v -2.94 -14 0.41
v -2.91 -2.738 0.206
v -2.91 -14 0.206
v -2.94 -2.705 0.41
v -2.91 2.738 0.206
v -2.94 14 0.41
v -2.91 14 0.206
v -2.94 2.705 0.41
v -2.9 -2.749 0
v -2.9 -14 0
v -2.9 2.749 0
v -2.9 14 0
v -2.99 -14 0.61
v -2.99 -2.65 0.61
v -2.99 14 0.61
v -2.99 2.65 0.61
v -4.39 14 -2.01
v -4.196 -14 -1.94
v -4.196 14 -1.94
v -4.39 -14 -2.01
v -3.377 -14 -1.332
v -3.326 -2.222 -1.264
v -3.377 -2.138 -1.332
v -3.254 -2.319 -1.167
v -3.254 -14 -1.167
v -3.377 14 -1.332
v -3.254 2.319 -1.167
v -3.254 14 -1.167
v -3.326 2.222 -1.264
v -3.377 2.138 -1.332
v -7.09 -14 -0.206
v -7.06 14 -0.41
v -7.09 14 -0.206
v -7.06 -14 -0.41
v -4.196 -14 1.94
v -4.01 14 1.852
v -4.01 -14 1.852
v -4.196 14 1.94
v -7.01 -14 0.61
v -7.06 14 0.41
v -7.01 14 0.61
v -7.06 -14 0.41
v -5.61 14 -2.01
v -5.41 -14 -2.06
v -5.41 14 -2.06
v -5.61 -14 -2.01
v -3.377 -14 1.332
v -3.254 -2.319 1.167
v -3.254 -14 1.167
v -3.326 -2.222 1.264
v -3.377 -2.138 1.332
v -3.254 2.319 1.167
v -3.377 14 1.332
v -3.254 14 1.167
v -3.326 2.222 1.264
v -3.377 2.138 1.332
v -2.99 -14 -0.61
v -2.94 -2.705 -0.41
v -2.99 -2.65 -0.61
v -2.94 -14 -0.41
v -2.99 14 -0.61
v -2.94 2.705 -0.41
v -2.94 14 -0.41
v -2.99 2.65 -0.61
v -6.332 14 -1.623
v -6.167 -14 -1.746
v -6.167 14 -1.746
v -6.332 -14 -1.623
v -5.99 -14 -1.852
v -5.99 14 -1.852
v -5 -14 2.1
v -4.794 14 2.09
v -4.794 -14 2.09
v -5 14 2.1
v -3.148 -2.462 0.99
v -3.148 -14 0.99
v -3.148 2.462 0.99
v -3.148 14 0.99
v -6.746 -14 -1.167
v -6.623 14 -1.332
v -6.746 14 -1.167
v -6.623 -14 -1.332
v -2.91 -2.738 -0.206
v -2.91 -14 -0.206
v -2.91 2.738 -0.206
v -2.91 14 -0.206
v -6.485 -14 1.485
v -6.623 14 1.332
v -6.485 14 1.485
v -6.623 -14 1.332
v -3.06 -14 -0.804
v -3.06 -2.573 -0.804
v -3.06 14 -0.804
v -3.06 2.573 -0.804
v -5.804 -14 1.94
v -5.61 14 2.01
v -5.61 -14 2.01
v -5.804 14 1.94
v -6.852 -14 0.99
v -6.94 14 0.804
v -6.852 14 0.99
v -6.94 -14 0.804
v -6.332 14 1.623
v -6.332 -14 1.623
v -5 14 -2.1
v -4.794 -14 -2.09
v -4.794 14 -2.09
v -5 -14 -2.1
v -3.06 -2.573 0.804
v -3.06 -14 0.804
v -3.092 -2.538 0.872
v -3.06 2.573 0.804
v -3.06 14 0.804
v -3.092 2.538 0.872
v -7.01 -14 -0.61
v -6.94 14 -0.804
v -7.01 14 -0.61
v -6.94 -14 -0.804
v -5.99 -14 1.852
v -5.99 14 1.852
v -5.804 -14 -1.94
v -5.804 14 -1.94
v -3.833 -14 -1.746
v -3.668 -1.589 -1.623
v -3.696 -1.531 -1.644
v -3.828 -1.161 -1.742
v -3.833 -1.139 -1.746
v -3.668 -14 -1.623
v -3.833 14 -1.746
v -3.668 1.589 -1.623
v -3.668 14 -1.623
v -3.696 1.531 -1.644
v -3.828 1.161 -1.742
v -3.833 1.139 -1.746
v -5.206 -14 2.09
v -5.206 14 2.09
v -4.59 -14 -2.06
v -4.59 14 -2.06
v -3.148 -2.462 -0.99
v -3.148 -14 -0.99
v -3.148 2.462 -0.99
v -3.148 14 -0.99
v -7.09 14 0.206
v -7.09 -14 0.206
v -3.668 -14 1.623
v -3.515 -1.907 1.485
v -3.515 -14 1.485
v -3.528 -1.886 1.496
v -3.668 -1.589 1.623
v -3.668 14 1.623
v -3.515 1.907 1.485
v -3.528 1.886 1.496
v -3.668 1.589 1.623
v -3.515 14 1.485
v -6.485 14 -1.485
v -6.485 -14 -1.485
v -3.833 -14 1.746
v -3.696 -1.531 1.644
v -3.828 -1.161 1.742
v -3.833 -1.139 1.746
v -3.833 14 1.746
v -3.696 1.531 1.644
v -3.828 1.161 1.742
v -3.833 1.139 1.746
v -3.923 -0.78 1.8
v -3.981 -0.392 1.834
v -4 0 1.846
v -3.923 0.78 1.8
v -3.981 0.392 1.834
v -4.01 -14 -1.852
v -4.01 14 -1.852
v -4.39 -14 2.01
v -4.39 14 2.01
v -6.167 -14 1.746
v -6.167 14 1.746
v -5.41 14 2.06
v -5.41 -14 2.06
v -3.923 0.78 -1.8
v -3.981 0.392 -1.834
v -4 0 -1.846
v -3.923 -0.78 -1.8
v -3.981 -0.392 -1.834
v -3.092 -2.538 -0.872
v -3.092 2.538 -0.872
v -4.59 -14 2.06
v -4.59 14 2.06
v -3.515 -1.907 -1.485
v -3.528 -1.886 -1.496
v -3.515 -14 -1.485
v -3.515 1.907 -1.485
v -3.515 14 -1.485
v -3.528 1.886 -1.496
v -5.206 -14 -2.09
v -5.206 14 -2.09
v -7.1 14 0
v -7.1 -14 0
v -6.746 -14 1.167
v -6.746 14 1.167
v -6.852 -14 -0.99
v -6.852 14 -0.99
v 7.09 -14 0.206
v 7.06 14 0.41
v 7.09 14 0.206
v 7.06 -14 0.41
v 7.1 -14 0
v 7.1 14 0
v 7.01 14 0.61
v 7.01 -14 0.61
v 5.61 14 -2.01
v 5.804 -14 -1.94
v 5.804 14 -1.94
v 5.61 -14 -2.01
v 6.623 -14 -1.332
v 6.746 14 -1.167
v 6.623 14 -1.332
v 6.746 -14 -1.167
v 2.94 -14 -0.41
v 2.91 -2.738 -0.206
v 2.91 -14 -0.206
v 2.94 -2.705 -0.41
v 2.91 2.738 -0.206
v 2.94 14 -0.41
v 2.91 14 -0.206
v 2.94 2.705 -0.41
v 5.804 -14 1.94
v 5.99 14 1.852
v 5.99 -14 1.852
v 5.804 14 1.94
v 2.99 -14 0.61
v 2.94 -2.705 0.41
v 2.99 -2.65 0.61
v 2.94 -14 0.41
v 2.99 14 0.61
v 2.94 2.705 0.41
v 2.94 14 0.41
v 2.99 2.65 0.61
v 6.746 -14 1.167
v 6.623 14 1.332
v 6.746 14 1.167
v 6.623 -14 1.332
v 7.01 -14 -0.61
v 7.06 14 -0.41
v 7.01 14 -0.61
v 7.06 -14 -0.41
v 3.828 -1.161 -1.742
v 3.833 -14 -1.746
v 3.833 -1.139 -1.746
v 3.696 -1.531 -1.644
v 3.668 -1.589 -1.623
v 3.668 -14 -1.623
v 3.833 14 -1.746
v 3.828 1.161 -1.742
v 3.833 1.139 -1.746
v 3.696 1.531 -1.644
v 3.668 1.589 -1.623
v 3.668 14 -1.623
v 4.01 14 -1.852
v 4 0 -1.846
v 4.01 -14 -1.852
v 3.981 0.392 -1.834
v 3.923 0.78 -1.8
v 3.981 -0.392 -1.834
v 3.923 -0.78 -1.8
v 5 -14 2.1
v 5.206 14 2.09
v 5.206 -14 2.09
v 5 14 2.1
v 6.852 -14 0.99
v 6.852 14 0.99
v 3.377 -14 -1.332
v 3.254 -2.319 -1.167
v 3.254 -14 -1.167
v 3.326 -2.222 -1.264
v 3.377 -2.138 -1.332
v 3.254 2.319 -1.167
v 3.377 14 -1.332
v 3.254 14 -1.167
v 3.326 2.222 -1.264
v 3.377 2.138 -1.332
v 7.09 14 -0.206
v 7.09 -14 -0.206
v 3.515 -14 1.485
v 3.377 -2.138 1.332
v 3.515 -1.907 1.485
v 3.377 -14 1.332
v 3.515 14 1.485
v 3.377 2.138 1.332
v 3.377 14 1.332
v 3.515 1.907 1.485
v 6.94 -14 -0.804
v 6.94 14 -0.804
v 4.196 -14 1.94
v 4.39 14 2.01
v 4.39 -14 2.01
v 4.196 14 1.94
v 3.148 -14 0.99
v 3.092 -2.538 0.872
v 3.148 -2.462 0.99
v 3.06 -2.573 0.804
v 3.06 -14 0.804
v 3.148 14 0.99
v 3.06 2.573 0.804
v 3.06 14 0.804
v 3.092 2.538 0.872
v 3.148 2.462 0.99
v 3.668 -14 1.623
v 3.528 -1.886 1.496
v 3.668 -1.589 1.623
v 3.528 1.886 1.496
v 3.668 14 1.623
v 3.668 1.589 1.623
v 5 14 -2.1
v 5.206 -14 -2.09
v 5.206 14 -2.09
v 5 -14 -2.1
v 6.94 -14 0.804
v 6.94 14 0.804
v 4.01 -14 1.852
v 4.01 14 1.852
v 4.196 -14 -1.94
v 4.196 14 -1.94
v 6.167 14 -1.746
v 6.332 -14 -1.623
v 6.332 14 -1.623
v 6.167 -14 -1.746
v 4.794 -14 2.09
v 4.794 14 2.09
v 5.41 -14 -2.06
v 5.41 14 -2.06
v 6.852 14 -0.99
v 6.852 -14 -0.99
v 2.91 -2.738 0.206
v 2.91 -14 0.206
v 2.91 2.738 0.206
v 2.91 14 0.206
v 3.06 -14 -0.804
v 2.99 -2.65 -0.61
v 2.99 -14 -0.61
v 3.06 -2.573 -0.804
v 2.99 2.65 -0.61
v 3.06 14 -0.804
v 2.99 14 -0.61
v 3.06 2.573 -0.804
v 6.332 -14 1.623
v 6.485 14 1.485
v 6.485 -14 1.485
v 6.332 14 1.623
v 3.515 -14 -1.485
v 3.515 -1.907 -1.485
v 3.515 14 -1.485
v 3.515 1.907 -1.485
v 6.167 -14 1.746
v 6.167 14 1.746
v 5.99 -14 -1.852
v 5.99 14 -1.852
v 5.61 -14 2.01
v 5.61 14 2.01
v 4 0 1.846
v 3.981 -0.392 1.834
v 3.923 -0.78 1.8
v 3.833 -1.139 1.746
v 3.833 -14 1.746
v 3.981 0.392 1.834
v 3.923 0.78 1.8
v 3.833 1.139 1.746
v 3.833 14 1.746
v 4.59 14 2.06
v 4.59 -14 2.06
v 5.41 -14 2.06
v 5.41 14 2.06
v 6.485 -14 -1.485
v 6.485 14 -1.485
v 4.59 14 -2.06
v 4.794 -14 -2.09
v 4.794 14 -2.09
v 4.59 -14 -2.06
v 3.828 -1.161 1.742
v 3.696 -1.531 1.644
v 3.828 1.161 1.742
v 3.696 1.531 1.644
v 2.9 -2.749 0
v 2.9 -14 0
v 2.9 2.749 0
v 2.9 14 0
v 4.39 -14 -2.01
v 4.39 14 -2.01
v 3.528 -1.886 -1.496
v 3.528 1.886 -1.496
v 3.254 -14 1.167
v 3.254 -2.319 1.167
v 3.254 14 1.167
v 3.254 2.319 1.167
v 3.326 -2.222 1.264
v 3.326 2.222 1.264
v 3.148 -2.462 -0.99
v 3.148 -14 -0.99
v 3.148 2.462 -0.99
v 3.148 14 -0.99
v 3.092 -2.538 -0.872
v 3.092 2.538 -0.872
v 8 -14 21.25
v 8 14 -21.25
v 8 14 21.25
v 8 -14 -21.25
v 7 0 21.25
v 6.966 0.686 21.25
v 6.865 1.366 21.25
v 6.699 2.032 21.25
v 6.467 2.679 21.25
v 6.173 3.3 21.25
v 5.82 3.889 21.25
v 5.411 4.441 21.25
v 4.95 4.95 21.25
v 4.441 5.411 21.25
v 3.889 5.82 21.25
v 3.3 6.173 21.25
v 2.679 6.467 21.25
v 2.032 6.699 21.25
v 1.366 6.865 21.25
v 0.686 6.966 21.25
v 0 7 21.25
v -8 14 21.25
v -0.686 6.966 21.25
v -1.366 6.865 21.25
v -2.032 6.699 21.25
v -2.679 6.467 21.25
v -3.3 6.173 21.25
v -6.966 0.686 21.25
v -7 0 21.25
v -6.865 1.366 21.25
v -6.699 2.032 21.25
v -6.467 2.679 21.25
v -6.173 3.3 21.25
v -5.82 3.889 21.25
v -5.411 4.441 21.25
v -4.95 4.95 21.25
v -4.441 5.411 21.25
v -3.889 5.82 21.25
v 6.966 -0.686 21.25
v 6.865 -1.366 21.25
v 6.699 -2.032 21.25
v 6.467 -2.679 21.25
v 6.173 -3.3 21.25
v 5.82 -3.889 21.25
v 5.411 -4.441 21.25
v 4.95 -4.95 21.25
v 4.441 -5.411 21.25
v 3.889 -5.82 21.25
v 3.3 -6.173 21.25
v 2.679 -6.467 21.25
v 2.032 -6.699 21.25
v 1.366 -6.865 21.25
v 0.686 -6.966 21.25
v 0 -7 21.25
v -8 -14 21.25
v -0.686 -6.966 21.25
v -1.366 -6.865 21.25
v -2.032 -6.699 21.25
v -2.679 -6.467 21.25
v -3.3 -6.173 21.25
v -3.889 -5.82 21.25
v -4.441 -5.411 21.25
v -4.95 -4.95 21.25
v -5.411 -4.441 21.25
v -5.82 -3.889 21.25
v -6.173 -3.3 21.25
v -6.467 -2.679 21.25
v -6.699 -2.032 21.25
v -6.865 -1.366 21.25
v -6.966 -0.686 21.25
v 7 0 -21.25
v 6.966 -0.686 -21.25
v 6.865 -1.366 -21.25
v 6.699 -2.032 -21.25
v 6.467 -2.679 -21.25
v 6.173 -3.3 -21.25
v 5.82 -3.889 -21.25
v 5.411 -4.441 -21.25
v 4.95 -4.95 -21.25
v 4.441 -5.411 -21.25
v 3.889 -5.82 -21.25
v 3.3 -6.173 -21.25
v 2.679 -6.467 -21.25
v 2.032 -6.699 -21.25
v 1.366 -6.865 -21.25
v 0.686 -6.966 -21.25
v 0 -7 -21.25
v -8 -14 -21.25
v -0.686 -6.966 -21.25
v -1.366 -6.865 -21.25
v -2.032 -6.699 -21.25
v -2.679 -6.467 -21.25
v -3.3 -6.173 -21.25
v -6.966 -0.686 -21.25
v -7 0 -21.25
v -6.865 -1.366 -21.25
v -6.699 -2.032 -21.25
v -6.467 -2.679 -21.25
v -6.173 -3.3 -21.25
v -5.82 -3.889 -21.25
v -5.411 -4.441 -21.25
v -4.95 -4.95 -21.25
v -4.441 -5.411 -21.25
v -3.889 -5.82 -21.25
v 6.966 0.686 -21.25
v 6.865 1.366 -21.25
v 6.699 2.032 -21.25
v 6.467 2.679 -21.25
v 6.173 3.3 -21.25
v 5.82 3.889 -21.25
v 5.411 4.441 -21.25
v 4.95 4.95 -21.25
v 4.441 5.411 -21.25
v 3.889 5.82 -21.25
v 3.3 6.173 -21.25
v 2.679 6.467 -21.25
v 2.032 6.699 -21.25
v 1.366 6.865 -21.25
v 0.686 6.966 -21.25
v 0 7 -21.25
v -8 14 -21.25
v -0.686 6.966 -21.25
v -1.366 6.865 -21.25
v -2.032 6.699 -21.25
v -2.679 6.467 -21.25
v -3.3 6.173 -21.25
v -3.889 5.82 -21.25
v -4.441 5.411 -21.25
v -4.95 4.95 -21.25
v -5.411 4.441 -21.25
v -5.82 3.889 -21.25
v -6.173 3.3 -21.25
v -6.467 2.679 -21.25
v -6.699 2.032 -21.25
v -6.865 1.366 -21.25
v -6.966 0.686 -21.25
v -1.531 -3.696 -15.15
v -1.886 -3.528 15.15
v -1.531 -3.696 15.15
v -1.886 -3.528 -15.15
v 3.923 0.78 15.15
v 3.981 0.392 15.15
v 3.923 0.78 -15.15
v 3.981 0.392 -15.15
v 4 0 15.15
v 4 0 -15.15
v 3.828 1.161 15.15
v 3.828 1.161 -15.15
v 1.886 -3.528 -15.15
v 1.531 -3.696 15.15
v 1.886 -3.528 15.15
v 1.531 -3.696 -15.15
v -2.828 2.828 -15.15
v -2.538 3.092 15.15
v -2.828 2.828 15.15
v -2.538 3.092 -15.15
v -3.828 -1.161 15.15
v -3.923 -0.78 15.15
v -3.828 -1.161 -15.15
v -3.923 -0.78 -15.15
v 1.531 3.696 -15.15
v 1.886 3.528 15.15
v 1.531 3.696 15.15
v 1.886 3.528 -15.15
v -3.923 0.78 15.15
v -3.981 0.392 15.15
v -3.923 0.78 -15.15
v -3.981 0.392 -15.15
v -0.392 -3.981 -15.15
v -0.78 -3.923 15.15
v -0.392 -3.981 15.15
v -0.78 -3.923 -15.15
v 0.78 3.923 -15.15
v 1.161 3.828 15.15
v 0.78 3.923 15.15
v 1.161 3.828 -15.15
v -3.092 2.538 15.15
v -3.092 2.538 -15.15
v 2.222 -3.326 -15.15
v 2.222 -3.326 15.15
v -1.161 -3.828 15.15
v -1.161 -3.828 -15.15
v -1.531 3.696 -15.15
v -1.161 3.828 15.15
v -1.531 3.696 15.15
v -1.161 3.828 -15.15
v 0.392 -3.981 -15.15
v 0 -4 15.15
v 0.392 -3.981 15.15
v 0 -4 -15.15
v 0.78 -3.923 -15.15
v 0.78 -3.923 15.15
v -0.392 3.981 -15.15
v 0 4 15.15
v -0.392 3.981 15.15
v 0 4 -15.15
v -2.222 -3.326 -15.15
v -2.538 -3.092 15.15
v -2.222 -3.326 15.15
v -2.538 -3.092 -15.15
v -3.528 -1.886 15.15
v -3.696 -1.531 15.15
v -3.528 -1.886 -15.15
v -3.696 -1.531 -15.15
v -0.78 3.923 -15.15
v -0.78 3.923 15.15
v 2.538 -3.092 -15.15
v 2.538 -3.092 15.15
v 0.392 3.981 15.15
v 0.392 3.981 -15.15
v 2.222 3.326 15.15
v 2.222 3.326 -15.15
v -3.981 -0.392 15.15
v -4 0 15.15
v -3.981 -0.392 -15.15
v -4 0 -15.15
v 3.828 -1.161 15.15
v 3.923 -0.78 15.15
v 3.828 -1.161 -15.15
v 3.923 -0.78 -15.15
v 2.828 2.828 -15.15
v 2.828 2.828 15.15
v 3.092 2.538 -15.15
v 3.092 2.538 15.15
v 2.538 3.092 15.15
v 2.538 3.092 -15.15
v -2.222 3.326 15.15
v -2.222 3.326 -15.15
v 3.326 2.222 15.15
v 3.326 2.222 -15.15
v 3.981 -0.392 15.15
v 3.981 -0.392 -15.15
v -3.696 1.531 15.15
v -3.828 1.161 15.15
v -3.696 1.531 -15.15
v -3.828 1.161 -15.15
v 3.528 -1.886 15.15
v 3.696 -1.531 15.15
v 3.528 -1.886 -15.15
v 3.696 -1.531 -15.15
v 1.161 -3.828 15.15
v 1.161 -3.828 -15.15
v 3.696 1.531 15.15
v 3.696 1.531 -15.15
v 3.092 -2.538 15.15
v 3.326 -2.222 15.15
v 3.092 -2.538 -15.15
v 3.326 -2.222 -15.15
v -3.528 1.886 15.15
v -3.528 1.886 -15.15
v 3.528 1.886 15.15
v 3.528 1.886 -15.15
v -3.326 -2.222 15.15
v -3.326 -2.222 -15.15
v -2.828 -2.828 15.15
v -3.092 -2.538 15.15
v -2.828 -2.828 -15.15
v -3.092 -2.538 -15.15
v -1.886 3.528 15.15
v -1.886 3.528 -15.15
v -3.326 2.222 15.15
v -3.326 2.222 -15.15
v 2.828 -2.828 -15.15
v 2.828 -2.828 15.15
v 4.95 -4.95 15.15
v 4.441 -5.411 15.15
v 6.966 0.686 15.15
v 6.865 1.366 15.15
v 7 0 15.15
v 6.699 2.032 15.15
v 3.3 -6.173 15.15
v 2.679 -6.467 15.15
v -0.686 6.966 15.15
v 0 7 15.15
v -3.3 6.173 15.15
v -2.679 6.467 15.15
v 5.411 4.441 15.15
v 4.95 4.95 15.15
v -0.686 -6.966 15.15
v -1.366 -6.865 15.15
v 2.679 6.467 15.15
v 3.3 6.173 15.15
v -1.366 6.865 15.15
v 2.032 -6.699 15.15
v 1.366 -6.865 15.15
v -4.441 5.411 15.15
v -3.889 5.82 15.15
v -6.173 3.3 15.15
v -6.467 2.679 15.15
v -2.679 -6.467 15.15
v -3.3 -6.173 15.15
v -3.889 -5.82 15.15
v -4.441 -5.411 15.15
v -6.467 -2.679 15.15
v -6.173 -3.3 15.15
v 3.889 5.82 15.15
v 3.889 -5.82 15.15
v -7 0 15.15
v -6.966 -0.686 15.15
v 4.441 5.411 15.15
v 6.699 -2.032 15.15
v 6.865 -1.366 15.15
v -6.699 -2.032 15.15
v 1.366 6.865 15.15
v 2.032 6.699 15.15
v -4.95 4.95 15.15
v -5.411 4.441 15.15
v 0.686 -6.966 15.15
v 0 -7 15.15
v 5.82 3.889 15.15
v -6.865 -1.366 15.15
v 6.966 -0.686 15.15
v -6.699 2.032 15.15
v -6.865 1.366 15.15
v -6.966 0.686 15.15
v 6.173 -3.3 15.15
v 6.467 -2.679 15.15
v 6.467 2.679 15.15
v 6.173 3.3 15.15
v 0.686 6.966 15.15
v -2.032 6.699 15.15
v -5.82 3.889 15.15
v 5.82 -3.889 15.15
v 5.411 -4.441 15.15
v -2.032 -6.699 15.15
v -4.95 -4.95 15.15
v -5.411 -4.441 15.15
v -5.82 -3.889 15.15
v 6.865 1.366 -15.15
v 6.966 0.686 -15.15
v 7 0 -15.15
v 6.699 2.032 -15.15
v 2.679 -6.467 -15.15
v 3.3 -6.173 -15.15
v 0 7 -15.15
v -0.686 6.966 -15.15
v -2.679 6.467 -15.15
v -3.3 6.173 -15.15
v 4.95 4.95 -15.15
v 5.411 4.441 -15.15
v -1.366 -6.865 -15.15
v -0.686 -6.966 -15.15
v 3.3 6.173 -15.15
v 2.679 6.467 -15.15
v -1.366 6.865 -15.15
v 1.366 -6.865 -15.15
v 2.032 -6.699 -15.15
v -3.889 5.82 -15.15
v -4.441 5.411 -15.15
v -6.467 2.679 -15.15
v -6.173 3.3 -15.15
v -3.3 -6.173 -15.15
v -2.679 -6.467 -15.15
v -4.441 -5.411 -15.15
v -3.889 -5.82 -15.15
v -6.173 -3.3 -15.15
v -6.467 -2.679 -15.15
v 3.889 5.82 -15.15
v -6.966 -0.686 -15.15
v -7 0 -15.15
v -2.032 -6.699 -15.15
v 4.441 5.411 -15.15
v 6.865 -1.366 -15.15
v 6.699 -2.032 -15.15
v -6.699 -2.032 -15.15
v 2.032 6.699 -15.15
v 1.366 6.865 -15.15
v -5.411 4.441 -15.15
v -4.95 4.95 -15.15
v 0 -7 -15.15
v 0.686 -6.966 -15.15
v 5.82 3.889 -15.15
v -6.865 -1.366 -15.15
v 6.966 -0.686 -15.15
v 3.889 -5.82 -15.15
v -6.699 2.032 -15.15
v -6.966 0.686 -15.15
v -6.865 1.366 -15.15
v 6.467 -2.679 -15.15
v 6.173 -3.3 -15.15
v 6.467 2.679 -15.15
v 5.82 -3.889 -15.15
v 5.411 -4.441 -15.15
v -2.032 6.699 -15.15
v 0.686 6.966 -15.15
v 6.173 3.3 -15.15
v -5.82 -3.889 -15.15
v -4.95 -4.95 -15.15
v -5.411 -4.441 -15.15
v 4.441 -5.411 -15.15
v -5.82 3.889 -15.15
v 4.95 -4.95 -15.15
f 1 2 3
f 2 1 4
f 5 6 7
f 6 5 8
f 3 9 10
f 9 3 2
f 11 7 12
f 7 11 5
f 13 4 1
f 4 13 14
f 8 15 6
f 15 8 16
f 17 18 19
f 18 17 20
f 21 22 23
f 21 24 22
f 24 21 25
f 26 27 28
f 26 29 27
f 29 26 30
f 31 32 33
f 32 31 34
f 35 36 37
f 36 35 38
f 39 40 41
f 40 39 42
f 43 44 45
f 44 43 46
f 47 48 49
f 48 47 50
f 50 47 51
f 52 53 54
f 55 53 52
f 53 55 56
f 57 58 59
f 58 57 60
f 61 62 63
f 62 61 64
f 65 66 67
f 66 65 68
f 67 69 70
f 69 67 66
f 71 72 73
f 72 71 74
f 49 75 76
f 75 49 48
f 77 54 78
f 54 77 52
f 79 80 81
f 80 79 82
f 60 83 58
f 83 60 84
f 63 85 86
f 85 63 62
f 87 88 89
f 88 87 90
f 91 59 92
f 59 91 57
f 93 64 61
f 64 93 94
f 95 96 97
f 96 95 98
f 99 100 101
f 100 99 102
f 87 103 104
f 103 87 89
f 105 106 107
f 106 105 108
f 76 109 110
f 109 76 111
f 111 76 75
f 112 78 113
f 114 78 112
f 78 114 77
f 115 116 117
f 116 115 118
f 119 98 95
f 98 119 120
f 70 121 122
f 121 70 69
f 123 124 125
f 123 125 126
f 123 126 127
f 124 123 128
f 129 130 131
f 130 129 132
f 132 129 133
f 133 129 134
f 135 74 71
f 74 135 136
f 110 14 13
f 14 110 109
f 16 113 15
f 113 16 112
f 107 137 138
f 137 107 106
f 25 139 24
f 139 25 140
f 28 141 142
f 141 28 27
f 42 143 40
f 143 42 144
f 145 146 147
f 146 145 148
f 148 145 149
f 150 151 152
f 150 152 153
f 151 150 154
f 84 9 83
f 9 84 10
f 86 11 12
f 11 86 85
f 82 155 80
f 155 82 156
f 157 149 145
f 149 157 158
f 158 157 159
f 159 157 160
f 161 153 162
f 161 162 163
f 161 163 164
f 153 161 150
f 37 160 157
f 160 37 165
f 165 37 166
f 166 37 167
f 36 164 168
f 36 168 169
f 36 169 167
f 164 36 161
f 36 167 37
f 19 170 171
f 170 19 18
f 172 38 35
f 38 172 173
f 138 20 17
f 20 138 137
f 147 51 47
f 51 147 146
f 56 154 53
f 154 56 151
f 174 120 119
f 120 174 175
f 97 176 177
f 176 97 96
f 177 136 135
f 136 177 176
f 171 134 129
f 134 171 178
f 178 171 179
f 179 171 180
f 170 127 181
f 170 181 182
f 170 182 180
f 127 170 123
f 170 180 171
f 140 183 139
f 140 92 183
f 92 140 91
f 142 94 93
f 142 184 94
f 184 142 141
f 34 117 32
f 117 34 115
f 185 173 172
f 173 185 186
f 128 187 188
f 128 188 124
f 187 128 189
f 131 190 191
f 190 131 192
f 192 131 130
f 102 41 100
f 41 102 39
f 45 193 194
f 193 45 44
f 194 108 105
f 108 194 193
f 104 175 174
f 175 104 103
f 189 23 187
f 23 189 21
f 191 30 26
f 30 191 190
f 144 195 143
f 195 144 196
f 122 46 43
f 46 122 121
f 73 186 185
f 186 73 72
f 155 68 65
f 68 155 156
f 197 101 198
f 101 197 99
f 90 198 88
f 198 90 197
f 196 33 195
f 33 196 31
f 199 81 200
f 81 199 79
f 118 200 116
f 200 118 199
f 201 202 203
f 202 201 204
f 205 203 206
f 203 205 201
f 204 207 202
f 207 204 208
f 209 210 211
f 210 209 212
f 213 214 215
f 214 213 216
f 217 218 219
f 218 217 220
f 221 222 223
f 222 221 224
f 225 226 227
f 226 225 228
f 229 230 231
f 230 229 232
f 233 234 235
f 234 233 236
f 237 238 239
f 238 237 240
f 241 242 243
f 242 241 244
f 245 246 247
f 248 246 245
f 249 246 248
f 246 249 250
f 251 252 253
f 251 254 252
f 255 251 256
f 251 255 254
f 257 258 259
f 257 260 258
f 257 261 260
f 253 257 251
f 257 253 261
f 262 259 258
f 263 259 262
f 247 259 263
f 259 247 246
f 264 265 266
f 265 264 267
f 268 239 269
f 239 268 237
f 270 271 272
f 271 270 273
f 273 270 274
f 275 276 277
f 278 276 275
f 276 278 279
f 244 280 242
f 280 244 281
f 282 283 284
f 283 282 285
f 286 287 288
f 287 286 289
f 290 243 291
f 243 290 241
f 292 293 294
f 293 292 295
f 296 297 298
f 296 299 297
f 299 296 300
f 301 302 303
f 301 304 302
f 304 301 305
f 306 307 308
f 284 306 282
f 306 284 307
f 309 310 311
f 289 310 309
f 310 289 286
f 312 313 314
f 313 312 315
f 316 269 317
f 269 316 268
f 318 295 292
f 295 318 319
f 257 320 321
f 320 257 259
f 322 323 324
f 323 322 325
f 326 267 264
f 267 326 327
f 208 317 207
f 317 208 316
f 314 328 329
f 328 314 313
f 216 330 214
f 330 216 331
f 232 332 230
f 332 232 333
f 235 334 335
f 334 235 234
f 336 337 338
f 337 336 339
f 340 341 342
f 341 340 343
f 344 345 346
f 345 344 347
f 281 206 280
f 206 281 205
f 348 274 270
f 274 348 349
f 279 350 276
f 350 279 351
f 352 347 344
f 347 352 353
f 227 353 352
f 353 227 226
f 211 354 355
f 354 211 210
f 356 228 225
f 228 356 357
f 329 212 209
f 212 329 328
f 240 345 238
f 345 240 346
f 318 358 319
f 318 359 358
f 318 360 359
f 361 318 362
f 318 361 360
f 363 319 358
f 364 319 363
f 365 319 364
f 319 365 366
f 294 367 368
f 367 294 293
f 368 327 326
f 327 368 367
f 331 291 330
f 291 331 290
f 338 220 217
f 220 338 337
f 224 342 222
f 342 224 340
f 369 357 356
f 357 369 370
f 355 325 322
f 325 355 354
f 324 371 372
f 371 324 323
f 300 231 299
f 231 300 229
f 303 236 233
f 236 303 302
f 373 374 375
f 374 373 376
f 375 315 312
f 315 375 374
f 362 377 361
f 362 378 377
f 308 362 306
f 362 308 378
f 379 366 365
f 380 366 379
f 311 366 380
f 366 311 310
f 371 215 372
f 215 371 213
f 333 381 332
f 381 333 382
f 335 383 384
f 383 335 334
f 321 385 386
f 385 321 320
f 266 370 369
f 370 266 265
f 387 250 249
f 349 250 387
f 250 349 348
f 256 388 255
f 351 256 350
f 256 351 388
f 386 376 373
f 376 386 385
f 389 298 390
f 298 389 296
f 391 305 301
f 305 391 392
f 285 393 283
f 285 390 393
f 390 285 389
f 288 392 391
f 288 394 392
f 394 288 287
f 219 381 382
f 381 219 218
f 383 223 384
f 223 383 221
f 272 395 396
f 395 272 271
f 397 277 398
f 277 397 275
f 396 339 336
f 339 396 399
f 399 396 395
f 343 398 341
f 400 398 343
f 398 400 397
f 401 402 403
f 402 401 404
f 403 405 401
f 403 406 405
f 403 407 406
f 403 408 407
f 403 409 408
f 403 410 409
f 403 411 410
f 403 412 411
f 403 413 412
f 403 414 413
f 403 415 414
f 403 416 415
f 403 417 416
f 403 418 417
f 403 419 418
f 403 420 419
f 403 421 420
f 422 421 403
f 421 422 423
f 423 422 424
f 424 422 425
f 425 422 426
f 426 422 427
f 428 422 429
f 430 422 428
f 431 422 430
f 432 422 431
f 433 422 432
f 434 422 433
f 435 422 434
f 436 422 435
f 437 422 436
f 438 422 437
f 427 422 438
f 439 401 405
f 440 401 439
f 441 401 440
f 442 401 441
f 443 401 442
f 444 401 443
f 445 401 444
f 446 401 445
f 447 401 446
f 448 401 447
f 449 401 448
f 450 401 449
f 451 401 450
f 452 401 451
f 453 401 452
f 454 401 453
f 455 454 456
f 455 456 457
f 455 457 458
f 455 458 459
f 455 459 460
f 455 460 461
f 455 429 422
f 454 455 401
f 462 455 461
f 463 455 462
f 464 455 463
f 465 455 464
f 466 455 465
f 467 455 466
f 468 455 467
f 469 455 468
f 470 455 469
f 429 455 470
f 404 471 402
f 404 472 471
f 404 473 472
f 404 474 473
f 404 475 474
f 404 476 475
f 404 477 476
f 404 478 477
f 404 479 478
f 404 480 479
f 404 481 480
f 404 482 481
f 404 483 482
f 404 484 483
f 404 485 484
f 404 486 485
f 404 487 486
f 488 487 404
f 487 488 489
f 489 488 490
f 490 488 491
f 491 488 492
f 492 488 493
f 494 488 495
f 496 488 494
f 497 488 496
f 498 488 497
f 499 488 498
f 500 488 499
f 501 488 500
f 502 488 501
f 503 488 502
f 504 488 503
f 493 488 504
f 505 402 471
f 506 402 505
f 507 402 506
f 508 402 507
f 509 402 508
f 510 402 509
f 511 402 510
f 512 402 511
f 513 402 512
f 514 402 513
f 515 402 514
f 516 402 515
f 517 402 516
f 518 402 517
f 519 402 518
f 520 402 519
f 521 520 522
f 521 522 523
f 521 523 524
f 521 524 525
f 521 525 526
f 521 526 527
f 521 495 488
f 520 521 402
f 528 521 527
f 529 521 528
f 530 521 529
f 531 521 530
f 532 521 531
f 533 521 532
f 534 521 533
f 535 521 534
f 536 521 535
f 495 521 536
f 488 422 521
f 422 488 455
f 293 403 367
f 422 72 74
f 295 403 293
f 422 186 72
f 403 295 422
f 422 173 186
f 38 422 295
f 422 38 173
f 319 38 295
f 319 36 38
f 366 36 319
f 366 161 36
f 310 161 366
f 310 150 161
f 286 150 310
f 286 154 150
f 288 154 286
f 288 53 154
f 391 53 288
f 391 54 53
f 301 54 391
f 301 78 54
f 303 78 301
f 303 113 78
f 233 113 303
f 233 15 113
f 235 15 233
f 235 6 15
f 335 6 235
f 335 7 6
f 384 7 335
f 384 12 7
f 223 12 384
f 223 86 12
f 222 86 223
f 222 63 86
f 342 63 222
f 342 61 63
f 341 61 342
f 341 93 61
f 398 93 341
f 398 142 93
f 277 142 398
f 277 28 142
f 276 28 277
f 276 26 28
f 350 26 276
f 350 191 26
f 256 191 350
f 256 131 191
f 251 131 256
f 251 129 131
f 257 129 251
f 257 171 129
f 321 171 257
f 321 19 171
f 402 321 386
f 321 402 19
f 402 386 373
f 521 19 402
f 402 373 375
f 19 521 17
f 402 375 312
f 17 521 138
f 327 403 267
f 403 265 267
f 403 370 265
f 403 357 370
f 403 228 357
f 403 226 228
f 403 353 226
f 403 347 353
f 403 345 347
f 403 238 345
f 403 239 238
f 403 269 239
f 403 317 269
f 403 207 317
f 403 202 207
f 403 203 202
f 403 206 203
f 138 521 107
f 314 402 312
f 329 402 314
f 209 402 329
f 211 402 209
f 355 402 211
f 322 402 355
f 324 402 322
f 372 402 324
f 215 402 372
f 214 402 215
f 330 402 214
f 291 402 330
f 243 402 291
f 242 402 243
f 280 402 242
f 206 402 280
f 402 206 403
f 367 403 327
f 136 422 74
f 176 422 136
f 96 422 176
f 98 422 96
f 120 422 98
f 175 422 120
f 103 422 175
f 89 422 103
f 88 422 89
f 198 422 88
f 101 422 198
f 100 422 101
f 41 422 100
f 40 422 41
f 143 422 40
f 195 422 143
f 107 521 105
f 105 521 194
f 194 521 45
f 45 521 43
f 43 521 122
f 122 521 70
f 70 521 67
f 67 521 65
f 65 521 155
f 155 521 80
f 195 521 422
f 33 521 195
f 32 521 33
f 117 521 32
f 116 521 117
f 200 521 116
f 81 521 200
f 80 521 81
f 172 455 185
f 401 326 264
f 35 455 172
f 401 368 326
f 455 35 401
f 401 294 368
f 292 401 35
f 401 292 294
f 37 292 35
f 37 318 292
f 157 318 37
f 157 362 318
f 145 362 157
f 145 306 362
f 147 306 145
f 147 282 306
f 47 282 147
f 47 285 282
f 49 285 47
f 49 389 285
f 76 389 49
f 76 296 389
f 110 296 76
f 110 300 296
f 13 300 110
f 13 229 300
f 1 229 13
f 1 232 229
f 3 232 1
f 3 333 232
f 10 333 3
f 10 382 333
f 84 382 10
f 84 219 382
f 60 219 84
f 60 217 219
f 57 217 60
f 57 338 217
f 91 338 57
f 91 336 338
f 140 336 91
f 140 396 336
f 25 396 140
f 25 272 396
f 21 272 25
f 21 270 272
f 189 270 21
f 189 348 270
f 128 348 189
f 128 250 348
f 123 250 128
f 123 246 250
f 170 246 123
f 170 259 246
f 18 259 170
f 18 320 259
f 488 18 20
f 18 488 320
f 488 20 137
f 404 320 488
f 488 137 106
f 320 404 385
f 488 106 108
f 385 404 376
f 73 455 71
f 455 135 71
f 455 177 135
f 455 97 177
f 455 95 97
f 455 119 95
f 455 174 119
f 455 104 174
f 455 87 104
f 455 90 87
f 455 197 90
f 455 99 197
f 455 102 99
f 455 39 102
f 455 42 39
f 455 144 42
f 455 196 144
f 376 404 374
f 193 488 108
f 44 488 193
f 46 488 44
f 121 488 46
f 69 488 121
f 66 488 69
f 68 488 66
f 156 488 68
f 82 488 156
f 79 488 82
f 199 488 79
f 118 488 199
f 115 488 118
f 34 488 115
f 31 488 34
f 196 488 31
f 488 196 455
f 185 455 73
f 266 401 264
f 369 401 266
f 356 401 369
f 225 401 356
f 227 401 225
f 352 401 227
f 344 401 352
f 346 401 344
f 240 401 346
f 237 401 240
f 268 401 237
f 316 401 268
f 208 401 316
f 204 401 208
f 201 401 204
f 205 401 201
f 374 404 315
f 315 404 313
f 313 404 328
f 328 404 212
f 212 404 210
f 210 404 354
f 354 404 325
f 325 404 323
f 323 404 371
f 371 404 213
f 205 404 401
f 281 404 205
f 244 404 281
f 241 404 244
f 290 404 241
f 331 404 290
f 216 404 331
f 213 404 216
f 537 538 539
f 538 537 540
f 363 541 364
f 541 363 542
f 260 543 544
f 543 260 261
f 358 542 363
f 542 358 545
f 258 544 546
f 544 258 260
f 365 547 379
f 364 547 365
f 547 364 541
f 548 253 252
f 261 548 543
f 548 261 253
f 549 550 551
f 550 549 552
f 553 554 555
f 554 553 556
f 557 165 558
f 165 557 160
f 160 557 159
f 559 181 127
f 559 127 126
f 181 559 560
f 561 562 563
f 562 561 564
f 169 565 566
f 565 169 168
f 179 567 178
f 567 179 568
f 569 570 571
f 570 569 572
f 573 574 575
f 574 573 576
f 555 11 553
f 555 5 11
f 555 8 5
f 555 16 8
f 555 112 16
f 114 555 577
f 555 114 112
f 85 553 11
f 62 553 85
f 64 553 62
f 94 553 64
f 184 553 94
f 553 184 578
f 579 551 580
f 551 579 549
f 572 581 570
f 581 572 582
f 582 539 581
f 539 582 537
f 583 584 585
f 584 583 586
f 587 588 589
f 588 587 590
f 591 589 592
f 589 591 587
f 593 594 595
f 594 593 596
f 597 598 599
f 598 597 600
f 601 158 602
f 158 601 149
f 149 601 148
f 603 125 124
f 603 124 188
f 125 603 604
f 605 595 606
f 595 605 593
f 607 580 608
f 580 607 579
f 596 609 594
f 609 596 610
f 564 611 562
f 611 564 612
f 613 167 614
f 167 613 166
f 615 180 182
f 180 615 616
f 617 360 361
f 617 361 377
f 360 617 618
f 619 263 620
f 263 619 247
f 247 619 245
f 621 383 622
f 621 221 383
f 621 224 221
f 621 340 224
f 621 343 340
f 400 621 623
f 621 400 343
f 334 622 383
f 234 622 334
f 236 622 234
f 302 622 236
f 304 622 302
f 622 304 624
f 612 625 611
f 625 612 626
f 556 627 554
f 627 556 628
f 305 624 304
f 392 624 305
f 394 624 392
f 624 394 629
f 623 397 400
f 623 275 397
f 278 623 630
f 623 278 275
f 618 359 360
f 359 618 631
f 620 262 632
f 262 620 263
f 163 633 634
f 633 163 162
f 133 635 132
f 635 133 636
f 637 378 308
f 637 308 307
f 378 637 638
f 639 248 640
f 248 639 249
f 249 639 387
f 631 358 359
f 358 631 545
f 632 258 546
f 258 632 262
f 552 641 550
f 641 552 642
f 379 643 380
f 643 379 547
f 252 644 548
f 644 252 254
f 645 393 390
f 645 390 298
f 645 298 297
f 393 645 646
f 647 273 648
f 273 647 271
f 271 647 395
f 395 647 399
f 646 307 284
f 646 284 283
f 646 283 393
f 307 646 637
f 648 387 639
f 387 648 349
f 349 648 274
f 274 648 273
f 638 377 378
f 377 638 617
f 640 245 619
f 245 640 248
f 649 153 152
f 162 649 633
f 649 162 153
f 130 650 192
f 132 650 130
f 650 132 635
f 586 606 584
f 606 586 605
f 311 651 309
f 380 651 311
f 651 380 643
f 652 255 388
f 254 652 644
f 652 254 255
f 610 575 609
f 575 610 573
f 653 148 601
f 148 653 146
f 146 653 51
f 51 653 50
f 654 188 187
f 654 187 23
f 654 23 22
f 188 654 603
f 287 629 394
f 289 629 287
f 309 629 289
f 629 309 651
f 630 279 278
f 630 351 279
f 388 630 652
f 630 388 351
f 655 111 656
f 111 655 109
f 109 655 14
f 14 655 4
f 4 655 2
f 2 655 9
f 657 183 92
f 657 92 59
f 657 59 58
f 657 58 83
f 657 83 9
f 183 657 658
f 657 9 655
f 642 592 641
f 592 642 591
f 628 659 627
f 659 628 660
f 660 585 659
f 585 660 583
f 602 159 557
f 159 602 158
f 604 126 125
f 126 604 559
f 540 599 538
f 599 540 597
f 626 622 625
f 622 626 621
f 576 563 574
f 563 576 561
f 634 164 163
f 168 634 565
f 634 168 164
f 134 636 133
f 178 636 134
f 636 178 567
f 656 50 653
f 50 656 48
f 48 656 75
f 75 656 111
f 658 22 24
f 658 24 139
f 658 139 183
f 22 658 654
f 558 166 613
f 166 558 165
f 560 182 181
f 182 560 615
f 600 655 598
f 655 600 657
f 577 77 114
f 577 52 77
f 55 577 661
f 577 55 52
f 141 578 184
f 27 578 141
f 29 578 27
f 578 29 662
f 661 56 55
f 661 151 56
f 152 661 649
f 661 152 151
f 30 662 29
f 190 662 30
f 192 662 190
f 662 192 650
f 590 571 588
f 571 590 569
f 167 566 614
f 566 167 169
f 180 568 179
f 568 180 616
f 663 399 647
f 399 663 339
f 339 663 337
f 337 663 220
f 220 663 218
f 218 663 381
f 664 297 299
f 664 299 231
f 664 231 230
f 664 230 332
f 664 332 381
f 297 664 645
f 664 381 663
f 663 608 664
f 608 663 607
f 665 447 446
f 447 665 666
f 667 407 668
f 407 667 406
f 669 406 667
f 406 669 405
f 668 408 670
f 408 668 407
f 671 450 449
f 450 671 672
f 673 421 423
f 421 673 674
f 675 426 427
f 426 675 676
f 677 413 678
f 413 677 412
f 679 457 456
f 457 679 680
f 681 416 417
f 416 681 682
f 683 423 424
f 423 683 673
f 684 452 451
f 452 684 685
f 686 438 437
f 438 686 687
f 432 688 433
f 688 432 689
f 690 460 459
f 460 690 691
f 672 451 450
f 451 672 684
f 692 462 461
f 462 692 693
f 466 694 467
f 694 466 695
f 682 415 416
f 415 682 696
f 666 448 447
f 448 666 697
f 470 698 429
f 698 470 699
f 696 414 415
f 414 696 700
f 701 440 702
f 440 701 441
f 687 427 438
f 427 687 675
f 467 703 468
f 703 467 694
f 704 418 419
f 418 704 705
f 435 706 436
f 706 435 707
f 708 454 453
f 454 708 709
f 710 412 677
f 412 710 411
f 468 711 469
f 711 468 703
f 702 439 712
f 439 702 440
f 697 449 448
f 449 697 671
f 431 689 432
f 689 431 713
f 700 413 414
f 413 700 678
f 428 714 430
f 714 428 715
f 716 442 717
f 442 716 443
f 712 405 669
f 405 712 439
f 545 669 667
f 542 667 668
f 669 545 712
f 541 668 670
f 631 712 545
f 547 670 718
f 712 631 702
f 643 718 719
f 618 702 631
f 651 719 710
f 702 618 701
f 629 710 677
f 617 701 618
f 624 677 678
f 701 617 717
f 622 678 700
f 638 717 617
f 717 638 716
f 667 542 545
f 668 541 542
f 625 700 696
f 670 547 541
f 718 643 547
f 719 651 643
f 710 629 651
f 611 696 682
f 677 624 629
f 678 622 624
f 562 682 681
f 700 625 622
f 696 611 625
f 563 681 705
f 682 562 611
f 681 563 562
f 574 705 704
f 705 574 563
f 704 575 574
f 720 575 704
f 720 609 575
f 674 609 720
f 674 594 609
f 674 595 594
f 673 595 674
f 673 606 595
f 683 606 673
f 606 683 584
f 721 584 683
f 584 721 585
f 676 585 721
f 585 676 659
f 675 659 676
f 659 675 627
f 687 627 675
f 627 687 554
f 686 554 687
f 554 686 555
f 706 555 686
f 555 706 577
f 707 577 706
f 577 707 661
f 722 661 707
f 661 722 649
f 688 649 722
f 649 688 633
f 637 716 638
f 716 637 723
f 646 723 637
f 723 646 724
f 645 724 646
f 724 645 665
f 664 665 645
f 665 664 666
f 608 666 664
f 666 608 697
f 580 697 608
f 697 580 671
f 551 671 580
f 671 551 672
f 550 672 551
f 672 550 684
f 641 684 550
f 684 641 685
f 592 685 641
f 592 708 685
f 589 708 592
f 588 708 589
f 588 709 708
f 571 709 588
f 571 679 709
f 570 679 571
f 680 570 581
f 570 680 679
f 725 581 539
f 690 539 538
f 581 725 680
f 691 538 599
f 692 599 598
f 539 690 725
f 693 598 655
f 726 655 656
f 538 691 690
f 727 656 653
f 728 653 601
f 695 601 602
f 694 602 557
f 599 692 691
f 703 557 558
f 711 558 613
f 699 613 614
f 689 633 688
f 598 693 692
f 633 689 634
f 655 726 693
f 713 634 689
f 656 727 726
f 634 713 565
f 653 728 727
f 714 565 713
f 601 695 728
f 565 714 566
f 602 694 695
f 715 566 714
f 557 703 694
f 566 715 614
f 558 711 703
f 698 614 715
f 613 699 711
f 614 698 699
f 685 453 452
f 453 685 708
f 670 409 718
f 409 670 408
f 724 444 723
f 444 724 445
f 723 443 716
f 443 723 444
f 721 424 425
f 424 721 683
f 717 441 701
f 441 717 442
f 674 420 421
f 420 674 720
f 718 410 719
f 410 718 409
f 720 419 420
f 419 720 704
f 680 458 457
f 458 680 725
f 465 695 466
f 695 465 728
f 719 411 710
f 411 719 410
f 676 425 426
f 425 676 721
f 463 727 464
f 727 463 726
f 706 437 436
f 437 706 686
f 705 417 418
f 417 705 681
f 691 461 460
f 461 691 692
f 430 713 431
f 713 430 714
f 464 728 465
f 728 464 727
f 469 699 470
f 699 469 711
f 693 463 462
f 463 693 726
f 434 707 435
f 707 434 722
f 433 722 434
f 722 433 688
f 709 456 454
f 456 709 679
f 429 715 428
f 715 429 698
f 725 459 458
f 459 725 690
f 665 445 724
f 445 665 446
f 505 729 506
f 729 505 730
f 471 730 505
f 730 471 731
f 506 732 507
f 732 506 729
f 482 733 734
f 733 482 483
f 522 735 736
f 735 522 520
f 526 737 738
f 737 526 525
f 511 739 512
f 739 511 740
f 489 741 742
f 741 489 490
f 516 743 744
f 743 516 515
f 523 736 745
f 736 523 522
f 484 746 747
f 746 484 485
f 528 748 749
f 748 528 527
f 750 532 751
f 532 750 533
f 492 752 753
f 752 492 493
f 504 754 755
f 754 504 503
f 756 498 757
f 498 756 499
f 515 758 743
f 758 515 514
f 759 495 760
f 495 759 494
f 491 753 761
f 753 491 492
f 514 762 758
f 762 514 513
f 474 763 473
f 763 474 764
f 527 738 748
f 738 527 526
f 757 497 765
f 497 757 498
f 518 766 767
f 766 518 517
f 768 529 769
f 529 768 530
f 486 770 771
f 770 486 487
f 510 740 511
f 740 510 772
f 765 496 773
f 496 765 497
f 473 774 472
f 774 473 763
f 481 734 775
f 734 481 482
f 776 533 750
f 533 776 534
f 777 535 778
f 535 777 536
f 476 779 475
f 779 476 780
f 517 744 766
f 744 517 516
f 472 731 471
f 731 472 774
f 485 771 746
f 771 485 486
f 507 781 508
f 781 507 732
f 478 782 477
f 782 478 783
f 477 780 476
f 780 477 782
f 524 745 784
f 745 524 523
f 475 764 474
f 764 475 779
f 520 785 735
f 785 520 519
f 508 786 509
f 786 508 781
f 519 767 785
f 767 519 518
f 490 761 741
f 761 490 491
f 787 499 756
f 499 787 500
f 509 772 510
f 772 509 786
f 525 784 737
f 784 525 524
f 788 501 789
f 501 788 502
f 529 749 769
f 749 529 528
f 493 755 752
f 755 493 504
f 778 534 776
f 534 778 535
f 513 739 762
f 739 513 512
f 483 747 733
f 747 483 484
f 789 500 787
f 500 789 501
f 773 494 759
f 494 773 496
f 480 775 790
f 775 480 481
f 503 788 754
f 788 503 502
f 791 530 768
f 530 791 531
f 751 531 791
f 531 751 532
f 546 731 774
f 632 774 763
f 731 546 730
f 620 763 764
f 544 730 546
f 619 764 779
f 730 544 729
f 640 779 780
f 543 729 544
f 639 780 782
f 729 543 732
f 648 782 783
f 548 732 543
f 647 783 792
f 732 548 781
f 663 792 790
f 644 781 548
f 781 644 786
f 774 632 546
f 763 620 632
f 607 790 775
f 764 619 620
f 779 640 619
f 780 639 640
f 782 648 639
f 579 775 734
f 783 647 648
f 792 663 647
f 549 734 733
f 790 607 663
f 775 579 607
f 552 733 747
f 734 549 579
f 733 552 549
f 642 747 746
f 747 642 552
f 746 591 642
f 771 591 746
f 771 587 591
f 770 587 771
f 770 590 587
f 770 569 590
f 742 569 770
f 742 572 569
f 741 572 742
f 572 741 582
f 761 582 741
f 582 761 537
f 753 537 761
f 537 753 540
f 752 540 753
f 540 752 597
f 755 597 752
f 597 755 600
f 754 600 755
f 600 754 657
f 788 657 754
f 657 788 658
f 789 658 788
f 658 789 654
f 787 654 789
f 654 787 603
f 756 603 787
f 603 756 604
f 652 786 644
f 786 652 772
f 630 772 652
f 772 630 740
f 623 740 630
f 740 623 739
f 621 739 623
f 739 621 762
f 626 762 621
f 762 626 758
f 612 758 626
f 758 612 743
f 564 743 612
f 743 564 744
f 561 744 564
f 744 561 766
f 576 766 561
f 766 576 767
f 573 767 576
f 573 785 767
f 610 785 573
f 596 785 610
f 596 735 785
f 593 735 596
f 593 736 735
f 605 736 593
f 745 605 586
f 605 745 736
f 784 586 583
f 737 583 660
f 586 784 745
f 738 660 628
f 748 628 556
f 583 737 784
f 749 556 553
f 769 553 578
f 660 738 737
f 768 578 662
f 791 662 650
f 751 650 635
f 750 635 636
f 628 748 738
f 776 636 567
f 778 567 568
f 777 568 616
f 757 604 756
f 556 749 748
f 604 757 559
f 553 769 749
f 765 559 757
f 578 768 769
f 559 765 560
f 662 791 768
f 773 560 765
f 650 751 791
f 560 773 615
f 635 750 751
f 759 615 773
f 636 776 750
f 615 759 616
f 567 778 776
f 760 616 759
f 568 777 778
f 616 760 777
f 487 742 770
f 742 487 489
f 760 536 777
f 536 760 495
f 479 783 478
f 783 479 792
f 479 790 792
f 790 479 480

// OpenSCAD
$fn=64;

block_x = 16.0;
block_y = 28.0;
block_z = 42.5;

lead_bore_d = 8.0;
counterbore_d = 14.0;
counterbore_depth = 6.0;

mount_hole_d = 4.2;
mount_hole_x_offset = 5.0;
mount_hole_y_offset = 9.0;

module centered_block(x,y,z){
    translate([-x/2,-y/2,-z/2]) cube([x,y,z], center=false);
}

module mount_holes(){
    for (sx=[-1,1], sy=[-1,1]){
        translate([sx*mount_hole_x_offset, sy*mount_hole_y_offset, 0])
            rotate([90,0,0])
                cylinder(d=mount_hole_d, h=block_y+2, center=true);
    }
}

difference(){
    centered_block(block_x, block_y, block_z);

    // Leadscrew through-bore (along Z)
    cylinder(d=lead_bore_d, h=block_z+2, center=true);

    // Counterbores on both ends (along Z)
    translate([0,0, block_z/2 - counterbore_depth/2])
        cylinder(d=counterbore_d, h=counterbore_depth+0.2, center=true);
    translate([0,0,-block_z/2 + counterbore_depth/2])
        cylinder(d=counterbore_d, h=counterbore_depth+0.2, center=true);

    // Mounting holes (through Y)
    mount_holes();
}
